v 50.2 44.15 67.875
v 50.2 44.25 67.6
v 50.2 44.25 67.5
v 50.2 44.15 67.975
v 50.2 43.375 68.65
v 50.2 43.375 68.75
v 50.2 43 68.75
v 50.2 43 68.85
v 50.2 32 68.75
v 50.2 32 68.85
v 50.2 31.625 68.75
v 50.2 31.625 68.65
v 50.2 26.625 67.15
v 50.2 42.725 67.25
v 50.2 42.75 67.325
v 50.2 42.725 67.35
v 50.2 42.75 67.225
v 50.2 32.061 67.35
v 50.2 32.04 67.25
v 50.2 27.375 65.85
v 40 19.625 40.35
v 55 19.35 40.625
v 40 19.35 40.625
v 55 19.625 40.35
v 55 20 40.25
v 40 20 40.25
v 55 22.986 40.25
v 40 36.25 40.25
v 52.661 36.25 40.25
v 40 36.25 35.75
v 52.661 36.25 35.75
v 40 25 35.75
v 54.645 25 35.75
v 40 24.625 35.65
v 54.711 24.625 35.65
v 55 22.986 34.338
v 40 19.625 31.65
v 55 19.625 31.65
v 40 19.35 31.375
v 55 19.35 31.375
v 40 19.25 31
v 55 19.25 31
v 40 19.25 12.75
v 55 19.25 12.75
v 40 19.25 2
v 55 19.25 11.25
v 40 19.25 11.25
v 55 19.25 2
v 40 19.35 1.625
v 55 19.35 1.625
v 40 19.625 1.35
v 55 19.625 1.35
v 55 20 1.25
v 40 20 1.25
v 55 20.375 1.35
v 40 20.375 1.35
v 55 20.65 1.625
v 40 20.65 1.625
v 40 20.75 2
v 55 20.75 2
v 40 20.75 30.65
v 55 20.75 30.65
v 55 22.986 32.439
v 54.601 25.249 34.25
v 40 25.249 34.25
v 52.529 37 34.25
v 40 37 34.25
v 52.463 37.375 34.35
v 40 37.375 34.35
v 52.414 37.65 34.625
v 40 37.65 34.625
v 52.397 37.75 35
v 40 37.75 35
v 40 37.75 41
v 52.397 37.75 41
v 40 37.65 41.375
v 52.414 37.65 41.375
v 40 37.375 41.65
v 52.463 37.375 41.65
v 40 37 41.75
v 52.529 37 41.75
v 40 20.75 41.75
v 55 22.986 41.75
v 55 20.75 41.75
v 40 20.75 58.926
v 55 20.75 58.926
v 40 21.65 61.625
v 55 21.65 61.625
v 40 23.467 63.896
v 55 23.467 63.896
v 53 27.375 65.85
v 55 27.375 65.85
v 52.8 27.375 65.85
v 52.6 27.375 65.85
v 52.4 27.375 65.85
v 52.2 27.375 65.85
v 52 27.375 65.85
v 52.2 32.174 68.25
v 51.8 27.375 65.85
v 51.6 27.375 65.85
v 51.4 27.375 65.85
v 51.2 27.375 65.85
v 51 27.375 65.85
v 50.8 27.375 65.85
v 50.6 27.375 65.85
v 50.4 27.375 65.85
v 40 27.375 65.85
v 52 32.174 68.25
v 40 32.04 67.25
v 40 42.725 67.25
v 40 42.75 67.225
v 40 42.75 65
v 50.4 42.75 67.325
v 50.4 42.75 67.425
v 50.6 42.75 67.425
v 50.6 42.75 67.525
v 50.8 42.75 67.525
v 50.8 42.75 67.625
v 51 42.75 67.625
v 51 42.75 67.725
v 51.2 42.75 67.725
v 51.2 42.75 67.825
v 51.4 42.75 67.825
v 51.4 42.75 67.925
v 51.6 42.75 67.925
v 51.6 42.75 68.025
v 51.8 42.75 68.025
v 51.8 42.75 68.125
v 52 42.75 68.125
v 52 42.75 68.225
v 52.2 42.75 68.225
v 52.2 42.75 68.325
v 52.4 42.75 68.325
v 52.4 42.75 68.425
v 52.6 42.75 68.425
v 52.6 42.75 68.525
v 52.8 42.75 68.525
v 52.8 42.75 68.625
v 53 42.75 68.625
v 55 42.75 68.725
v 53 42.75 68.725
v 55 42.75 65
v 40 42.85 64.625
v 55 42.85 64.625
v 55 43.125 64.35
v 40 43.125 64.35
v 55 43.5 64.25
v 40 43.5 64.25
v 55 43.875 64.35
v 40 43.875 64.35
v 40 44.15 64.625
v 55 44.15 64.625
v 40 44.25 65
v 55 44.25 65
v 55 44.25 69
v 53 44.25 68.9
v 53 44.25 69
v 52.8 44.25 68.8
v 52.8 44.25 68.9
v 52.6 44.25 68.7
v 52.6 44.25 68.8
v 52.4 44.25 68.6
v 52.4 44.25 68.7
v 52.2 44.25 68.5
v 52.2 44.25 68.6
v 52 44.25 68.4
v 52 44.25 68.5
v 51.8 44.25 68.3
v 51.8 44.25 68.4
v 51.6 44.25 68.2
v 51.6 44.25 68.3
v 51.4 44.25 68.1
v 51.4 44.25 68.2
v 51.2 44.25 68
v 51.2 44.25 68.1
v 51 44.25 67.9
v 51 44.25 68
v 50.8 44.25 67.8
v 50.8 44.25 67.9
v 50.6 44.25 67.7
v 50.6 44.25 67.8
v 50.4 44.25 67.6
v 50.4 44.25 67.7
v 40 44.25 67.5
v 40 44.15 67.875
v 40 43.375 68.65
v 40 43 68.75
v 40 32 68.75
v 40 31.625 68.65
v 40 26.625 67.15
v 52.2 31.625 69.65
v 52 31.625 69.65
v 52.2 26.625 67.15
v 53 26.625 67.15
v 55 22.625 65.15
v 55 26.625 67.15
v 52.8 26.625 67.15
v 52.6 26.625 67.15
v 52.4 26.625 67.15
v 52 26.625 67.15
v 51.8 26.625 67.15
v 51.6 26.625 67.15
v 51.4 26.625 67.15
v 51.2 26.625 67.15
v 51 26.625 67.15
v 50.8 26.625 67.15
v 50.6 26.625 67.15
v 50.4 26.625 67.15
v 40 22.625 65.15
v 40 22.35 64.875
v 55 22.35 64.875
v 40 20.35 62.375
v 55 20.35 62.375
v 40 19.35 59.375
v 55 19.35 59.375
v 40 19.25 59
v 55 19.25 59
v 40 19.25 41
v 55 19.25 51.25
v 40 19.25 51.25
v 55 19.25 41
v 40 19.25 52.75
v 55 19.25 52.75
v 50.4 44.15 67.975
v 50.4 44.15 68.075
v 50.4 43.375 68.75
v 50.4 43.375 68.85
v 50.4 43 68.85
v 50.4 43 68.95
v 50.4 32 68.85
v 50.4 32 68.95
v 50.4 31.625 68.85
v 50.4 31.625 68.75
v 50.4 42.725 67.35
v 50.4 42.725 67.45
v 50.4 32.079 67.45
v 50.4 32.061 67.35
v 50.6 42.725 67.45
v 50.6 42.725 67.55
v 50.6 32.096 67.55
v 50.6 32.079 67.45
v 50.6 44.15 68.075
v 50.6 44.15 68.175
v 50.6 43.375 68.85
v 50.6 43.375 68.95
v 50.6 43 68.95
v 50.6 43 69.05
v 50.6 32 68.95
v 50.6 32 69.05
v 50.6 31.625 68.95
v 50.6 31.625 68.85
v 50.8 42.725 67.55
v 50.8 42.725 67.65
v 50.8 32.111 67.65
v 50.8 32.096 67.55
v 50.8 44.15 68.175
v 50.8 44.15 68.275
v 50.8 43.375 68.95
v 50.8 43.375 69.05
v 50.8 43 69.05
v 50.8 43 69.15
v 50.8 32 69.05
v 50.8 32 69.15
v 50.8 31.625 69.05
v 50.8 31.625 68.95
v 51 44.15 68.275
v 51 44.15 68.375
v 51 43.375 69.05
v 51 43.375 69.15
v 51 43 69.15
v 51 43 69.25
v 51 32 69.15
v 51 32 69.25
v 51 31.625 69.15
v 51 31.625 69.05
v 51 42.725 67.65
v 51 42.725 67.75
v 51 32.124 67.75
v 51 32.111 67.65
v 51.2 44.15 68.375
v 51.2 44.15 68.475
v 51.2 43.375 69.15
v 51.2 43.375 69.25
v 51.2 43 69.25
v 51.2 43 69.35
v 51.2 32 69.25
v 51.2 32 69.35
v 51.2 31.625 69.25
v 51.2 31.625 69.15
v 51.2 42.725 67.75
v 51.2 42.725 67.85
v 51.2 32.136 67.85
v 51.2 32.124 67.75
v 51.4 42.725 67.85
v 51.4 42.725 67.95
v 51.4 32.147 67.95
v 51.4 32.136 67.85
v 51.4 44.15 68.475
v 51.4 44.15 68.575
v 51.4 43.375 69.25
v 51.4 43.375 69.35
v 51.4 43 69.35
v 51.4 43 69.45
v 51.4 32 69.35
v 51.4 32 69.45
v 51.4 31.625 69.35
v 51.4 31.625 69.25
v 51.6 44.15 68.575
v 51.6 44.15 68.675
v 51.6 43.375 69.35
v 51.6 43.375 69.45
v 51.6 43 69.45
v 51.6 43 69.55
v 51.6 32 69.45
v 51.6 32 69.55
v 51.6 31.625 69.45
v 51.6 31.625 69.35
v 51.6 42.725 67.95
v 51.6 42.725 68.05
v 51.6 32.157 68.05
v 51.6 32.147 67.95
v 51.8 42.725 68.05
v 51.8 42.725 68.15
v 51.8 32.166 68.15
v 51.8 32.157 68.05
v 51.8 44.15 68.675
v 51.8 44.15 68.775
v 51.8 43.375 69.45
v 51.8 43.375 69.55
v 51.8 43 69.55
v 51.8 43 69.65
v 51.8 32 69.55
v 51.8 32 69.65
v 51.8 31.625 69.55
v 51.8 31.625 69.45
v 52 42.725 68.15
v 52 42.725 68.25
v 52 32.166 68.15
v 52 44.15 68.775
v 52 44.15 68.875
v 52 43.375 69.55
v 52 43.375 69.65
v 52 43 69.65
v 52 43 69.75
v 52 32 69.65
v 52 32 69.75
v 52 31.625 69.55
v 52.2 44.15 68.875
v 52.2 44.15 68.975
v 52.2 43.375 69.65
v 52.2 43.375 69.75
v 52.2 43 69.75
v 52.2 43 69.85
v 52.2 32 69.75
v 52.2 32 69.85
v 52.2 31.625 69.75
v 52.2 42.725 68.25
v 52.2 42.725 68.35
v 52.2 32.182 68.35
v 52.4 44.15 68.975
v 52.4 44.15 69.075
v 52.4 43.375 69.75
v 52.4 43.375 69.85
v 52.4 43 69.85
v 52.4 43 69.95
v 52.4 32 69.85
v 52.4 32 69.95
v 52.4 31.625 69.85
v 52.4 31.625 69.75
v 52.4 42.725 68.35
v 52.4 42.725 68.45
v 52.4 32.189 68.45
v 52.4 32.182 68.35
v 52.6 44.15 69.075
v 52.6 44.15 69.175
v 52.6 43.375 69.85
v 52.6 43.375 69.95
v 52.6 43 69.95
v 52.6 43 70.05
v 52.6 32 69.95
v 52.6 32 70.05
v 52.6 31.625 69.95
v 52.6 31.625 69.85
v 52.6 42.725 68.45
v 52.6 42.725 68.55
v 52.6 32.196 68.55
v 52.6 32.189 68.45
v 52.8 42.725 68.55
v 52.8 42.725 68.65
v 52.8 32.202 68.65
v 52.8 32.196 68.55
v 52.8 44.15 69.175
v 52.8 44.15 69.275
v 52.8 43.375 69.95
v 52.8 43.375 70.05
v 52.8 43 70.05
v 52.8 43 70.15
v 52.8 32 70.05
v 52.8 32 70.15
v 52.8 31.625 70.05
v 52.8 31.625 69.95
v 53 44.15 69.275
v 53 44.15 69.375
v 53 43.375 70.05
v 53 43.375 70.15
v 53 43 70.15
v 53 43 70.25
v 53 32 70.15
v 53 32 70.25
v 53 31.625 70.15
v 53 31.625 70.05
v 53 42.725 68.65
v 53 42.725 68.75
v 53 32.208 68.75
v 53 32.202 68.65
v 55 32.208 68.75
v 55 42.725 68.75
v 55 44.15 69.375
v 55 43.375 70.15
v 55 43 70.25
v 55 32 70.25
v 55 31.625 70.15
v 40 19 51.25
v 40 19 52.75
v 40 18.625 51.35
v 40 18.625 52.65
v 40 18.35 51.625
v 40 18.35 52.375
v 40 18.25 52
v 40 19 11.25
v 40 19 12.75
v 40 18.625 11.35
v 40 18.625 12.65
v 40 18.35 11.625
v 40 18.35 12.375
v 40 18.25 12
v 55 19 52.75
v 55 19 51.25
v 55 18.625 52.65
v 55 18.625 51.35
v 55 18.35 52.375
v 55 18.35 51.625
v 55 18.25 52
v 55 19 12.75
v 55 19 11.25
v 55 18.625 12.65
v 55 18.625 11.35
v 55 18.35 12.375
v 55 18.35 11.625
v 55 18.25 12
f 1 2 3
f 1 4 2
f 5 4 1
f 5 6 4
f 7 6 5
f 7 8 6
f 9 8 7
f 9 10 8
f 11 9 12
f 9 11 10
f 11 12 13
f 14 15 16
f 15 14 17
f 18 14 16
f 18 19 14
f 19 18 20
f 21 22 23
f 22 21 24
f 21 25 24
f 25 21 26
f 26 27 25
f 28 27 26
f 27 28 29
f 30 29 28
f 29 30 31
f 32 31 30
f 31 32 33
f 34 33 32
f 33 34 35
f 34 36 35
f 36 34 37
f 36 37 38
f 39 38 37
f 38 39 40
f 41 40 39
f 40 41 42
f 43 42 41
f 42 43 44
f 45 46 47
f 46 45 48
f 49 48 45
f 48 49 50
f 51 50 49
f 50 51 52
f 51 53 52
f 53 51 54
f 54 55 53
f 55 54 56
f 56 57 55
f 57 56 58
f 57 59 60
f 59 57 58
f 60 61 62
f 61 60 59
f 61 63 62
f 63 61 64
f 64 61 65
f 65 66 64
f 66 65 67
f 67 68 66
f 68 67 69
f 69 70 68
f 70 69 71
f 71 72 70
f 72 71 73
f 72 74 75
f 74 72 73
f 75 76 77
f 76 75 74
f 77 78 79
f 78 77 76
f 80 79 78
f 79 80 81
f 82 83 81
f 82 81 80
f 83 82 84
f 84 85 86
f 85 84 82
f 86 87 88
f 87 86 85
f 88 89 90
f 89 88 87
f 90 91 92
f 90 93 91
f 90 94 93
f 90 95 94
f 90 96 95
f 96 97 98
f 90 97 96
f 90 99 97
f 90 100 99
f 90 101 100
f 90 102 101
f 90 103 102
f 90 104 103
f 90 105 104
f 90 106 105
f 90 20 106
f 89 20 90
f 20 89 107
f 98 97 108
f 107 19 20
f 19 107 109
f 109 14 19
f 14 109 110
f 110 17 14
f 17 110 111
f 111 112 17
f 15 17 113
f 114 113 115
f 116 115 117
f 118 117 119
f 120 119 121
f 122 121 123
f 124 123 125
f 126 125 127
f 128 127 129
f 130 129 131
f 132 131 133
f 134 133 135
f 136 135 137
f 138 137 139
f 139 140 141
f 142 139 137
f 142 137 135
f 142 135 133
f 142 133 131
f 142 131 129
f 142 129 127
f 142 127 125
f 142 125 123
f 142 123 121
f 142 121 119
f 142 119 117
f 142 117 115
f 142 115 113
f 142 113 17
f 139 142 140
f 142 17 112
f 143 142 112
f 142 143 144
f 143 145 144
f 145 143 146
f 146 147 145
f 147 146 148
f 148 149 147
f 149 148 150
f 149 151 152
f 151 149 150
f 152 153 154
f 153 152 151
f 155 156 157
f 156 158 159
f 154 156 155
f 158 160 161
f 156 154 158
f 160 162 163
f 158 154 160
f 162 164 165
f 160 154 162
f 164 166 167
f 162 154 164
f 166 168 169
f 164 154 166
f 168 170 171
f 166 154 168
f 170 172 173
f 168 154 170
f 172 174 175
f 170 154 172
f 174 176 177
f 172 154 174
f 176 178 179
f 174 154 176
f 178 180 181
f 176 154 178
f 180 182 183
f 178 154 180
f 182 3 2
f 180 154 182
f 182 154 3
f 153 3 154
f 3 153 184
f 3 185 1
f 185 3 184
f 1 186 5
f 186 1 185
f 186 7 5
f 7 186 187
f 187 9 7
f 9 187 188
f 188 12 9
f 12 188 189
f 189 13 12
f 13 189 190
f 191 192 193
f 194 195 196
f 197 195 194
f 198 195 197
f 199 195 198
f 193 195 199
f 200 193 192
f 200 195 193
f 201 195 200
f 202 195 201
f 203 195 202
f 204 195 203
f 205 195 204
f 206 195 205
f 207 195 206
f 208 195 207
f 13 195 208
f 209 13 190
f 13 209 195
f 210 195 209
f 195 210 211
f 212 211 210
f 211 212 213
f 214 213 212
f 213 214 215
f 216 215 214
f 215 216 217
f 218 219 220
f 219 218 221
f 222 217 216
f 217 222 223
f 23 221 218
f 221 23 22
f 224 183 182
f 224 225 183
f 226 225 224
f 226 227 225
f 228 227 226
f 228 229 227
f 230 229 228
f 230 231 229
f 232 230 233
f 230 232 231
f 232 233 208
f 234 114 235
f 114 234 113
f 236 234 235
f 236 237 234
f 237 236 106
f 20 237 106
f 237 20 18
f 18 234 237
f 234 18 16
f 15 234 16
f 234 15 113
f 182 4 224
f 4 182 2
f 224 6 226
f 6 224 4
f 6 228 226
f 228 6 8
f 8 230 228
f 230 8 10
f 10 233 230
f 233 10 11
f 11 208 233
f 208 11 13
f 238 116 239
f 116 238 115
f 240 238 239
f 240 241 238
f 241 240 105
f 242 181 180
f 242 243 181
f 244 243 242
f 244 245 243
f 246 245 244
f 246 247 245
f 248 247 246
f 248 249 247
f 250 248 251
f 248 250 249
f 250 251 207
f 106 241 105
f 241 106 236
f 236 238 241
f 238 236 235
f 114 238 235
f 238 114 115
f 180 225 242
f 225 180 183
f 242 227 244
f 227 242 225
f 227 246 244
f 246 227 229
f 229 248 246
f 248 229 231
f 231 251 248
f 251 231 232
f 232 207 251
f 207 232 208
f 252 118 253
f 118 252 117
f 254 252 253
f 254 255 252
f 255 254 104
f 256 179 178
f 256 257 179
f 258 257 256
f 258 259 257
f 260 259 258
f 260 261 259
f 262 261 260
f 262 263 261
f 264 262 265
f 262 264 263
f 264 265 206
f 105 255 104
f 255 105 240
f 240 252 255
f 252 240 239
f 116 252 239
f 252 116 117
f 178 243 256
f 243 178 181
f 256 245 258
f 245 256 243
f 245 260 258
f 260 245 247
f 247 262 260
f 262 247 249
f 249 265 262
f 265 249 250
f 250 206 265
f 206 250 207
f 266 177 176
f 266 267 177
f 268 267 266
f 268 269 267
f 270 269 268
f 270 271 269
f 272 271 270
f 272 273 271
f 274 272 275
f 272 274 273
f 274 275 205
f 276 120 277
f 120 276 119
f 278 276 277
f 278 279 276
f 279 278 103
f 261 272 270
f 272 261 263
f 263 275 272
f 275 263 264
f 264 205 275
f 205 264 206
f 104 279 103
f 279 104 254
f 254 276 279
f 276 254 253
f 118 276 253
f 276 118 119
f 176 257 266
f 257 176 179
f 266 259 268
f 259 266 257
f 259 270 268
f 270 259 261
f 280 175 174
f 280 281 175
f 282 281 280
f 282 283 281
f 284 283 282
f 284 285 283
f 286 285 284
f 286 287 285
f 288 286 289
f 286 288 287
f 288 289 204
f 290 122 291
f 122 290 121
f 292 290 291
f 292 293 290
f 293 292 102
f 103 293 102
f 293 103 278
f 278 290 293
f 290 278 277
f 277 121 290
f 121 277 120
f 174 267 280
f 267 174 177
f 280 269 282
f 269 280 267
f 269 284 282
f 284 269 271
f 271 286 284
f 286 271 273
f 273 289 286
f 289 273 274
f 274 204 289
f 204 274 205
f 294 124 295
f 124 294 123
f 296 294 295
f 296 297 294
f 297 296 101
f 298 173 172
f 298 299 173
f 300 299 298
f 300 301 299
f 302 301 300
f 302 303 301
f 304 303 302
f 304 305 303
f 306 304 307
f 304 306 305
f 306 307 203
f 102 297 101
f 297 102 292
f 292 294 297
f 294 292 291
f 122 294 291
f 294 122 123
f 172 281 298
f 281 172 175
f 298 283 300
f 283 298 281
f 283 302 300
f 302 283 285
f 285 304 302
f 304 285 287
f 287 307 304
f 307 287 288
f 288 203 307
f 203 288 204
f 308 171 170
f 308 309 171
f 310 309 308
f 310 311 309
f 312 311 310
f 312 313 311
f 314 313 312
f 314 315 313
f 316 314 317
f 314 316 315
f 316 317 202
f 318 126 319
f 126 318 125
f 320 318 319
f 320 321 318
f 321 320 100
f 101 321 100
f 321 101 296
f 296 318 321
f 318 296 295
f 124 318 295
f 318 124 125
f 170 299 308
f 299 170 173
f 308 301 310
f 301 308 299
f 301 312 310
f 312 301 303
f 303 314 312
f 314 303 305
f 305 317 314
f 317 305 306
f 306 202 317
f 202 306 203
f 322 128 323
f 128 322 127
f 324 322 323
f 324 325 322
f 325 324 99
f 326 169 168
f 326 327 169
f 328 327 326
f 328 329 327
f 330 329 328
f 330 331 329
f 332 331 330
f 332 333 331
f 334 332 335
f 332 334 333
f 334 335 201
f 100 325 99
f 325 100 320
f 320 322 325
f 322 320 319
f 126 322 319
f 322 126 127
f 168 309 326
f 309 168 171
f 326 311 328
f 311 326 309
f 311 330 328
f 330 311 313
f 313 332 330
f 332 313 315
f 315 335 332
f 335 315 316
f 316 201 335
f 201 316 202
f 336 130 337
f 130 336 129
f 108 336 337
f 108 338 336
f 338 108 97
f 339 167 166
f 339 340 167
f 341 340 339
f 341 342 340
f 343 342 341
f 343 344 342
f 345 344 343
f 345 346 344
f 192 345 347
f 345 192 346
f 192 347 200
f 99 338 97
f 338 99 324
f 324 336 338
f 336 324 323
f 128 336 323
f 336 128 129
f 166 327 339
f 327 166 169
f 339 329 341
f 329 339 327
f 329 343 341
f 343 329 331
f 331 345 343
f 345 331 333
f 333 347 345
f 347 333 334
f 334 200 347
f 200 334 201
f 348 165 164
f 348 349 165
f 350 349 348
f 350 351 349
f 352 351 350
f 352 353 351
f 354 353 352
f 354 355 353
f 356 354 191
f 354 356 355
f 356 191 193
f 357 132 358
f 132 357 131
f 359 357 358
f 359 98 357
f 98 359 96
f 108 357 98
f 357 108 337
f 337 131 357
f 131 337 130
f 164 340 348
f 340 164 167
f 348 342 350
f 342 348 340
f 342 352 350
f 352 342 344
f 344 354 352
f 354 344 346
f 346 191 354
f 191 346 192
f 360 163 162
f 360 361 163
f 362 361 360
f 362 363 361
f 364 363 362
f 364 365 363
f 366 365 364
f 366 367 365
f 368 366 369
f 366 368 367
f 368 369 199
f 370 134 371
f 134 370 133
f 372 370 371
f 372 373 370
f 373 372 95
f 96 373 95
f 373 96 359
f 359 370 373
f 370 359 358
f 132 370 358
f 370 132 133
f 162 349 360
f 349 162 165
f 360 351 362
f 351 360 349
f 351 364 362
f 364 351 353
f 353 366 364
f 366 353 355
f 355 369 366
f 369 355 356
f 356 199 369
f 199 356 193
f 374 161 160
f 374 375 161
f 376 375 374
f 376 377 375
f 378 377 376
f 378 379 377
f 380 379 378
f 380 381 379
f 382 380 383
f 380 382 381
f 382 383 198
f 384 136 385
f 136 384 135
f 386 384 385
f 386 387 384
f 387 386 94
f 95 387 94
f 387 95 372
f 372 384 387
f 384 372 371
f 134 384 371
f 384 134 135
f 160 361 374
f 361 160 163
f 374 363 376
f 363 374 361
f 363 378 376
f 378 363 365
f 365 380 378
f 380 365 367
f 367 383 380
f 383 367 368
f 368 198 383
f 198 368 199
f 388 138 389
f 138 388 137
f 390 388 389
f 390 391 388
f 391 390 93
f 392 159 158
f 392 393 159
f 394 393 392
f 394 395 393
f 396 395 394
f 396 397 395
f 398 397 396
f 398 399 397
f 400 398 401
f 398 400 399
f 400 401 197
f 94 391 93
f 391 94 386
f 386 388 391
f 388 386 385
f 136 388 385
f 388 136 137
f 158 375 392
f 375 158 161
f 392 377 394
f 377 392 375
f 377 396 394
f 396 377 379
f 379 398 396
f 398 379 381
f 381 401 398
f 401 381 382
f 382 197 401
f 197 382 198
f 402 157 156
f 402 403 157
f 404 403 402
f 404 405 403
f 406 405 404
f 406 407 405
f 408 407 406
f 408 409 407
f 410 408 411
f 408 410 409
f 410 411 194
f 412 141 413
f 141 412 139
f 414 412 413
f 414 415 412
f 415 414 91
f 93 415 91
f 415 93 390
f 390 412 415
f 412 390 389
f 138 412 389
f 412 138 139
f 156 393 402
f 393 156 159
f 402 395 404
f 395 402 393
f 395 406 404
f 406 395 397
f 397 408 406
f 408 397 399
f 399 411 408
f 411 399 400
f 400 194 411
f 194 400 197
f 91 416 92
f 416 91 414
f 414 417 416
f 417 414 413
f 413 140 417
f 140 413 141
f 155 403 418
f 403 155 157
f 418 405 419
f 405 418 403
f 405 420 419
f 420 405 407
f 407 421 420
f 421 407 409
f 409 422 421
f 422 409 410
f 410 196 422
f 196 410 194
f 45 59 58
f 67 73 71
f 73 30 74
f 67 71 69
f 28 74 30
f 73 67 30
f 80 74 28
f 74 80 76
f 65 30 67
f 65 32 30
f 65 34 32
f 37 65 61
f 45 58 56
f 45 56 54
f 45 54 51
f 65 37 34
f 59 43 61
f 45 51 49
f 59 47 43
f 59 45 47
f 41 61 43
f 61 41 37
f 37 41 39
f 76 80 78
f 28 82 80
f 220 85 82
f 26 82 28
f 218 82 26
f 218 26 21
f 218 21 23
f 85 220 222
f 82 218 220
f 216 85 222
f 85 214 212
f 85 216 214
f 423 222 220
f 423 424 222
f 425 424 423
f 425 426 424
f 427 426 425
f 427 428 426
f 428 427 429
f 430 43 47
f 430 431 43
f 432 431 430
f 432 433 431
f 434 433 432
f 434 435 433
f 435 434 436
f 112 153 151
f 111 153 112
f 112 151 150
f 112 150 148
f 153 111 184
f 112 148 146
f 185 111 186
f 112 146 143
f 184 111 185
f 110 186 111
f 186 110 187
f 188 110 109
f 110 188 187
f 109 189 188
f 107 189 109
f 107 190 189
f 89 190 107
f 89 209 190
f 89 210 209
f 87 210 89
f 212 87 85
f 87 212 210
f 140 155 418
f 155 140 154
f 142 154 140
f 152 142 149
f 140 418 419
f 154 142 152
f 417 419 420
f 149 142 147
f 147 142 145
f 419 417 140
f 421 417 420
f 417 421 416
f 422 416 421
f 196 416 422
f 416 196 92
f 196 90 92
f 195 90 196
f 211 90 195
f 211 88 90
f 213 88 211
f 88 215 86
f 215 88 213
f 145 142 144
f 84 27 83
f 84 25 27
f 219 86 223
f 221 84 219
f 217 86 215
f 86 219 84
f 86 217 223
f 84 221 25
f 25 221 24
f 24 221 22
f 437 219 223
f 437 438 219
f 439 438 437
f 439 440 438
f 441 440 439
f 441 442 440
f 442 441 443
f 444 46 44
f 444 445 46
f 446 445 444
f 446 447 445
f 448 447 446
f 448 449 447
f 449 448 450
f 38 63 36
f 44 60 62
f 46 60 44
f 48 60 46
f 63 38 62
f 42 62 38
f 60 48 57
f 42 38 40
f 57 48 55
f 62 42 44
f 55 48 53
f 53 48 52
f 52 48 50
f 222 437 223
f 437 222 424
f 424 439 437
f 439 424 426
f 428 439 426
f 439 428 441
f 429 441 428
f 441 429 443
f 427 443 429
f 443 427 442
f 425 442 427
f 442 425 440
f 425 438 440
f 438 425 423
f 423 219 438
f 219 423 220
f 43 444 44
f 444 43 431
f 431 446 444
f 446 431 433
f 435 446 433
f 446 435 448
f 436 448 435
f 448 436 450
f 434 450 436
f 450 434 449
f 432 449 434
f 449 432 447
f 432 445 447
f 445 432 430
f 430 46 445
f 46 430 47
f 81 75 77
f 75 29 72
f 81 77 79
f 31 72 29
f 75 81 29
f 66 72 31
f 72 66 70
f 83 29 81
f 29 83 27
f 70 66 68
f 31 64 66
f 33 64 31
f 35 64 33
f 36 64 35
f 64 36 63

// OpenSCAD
LLL="LLL";LLC="LLC";LLR="LLR";LCL="LCL";LCC="LCC";LCR="LCR";LRL="LRL";LRC="LRC";LRR="LRR";
CLL="CLL";CLC="CLC";CLR="CLR";CCL="CCL";CCC="CCC";CCR="CCR";CRL="CRL";CRC="CRC";CRR="CRR";
RLL="RLL";RLC="RLC";RLR="RLR";RCL="RCL";RCC="RCC";RCR="RCR";RRL="RRL";RRC="RRC";RRR="RRR";
module cube2(size, center) {
  function align(i)=center[i]=="R"?-2:center[i]=="C"?-1:0;
  translate([align(0)*size[0]/2,align(1)*size[1]/2,align(2)*size[2]/2])cube(size);
}
module copy_x() { for(a=[0,1])mirror([a,0,0])children(); }
module copy_y() { for(a=[0,1])mirror([0,a,0])children(); }
module copy_z() { for(a=[0,1])mirror([0,0,a])children(); }
module move_x(d) { translate([d,0,0])children(); }
module move_y(d) { translate([0,d,0])children(); }
module move_z(d) { translate([0,0,d])children(); }


module cuber(size, radius, center) {
  function align(i)=center[i]=="R"?-1:center[i]=="C"?0:1;
  translate([align(0)*size[0]/2,align(1)*size[1]/2,align(2)*size[2]/2])
  hull()copy_x()copy_y()copy_z()translate([for (a=size) a*0.5-radius])sphere(r=radius,$fn=24);
}

module path(points) {
  for (i = [0:len(points)-2]) {
    xy1=points[i];
    xy2=points[i+1];
    hull() {
      translate(xy1)circle(d=1.5,$fn=12);
      translate(xy2)circle(d=1.5,$fn=12);
    }
  }
}
module hook() {
  module sketch(offset=0) {
    path([[-7,-3.5],
      [-4.5+offset,-3.5],
      [-4+offset,-3],
      [-4+offset,8],
      [-5.5,13],
      [-7.5,17],
      [-10,19],
      [-13,20],
      [-30,20],
      [-32,10],
      [-36,10],
      [-37,15],
      [-41,20],
      [-70,20],
    ]);
  }
  linear_extrude(10) sketch();
  for(a=[0:0.1:1.5])move_z(10+a*2)linear_extrude(0.2) sketch(a);
  move_z(10+1.5*2)linear_extrude(2) sketch(1.5);
  linear_extrude(15) {
    path([[-20,20],[-20,21]]);
    path([[-60,20],[-60,21]]);
  }
}
module hook2() {
  module sketch(offset=0) {
    path([[-7,-3.5],
      [-4.5+offset,-3.5],
      [-4+offset,-3],
      [-4+offset,8],
      [-5.5,13],
      [-7.5,17],
      [-10,19],
      [-13,20],
      [-31,20],
      [-31,3],
      [-37,3],
      [-37,15],
      [-41,20],
      [-70,20],
    ]);
  }
  difference() {
    union() {
      linear_extrude(10) sketch();
      for(a=[0:0.1:1.5])move_z(10+a*2)linear_extrude(0.2) sketch(a);
      move_z(10+1.5*2)linear_extrude(2) sketch(1.5);
      linear_extrude(15) {
        path([[-20,20],[-20,21]]);
        path([[-60,20],[-60,21]]);
      }
    }
    translate([-30,0,12])rotate([10,0])cube2([30,100,100],CCL);
  }
}

module phone(width=79,depth=12,height=100,r=3) {
  r2=8;
  r3=r2+r;
  minkowski() {
    hull()
    for(x=[-width/2+r3,width/2-r3])
      for(y=[depth/2])
        for(z=[r3,height-r3])
          translate([x,y,z]) rotate([90,0])cylinder(r=r2,$fn=24,center=true,h=depth-2*r);
    sphere(r=r,$fn=24);
  }
}

module phone2(width=79,depth=12,height=100,r=3) {
  hull()
  for(x=[-width/2+r,width/2-r])
    for(y=[r,depth-r])
      for(z=[r,height-r])
        translate([x,y,z]) sphere(r=r,$fn=24);
}

module holder() {
  x1=0 ;
  difference() {
    union() {
      difference() {
        //horizontal
        translate([0,-1.5,-1.5])
          phone(165+3,12+4.5,60+3,4.5);
        // flat top
        move_z(30)cube2([200,30,100],CCL);
      }
  
      //backplate
      rb=8;
      translate([0,12,79/2])rotate([-90,0]) hull() {
        copy_x()copy_y()translate([159/2-rb,70/2-rb])cylinder(r=rb,h=3);
      }

    }
    
    // main phone cavity
    phone(165,12,100);

    // front opening horizontal
    hull() {
      translate([0,2,79/2])cuber([165-14,10,79-14],8,CRC);
      translate([0,-10,79/2])cuber([165+10,10,79+10],8,CRC);
    }

    // bottom cutout
    cube2([80,24,50],CCC);
    
    // back grooves
    copy_x()for(a=[0,40])translate([129/2,13,12+a])cube2([15.5,10,1.6],RLC);
    
  }
}
//translate([40,40,72])rotate([0,-90,180])hook();
translate([40,40,72])rotate([0,-90,180])hook2();
//phone(165,12,100);
//move_y(20)phone2(165,12,100);

//holder();
